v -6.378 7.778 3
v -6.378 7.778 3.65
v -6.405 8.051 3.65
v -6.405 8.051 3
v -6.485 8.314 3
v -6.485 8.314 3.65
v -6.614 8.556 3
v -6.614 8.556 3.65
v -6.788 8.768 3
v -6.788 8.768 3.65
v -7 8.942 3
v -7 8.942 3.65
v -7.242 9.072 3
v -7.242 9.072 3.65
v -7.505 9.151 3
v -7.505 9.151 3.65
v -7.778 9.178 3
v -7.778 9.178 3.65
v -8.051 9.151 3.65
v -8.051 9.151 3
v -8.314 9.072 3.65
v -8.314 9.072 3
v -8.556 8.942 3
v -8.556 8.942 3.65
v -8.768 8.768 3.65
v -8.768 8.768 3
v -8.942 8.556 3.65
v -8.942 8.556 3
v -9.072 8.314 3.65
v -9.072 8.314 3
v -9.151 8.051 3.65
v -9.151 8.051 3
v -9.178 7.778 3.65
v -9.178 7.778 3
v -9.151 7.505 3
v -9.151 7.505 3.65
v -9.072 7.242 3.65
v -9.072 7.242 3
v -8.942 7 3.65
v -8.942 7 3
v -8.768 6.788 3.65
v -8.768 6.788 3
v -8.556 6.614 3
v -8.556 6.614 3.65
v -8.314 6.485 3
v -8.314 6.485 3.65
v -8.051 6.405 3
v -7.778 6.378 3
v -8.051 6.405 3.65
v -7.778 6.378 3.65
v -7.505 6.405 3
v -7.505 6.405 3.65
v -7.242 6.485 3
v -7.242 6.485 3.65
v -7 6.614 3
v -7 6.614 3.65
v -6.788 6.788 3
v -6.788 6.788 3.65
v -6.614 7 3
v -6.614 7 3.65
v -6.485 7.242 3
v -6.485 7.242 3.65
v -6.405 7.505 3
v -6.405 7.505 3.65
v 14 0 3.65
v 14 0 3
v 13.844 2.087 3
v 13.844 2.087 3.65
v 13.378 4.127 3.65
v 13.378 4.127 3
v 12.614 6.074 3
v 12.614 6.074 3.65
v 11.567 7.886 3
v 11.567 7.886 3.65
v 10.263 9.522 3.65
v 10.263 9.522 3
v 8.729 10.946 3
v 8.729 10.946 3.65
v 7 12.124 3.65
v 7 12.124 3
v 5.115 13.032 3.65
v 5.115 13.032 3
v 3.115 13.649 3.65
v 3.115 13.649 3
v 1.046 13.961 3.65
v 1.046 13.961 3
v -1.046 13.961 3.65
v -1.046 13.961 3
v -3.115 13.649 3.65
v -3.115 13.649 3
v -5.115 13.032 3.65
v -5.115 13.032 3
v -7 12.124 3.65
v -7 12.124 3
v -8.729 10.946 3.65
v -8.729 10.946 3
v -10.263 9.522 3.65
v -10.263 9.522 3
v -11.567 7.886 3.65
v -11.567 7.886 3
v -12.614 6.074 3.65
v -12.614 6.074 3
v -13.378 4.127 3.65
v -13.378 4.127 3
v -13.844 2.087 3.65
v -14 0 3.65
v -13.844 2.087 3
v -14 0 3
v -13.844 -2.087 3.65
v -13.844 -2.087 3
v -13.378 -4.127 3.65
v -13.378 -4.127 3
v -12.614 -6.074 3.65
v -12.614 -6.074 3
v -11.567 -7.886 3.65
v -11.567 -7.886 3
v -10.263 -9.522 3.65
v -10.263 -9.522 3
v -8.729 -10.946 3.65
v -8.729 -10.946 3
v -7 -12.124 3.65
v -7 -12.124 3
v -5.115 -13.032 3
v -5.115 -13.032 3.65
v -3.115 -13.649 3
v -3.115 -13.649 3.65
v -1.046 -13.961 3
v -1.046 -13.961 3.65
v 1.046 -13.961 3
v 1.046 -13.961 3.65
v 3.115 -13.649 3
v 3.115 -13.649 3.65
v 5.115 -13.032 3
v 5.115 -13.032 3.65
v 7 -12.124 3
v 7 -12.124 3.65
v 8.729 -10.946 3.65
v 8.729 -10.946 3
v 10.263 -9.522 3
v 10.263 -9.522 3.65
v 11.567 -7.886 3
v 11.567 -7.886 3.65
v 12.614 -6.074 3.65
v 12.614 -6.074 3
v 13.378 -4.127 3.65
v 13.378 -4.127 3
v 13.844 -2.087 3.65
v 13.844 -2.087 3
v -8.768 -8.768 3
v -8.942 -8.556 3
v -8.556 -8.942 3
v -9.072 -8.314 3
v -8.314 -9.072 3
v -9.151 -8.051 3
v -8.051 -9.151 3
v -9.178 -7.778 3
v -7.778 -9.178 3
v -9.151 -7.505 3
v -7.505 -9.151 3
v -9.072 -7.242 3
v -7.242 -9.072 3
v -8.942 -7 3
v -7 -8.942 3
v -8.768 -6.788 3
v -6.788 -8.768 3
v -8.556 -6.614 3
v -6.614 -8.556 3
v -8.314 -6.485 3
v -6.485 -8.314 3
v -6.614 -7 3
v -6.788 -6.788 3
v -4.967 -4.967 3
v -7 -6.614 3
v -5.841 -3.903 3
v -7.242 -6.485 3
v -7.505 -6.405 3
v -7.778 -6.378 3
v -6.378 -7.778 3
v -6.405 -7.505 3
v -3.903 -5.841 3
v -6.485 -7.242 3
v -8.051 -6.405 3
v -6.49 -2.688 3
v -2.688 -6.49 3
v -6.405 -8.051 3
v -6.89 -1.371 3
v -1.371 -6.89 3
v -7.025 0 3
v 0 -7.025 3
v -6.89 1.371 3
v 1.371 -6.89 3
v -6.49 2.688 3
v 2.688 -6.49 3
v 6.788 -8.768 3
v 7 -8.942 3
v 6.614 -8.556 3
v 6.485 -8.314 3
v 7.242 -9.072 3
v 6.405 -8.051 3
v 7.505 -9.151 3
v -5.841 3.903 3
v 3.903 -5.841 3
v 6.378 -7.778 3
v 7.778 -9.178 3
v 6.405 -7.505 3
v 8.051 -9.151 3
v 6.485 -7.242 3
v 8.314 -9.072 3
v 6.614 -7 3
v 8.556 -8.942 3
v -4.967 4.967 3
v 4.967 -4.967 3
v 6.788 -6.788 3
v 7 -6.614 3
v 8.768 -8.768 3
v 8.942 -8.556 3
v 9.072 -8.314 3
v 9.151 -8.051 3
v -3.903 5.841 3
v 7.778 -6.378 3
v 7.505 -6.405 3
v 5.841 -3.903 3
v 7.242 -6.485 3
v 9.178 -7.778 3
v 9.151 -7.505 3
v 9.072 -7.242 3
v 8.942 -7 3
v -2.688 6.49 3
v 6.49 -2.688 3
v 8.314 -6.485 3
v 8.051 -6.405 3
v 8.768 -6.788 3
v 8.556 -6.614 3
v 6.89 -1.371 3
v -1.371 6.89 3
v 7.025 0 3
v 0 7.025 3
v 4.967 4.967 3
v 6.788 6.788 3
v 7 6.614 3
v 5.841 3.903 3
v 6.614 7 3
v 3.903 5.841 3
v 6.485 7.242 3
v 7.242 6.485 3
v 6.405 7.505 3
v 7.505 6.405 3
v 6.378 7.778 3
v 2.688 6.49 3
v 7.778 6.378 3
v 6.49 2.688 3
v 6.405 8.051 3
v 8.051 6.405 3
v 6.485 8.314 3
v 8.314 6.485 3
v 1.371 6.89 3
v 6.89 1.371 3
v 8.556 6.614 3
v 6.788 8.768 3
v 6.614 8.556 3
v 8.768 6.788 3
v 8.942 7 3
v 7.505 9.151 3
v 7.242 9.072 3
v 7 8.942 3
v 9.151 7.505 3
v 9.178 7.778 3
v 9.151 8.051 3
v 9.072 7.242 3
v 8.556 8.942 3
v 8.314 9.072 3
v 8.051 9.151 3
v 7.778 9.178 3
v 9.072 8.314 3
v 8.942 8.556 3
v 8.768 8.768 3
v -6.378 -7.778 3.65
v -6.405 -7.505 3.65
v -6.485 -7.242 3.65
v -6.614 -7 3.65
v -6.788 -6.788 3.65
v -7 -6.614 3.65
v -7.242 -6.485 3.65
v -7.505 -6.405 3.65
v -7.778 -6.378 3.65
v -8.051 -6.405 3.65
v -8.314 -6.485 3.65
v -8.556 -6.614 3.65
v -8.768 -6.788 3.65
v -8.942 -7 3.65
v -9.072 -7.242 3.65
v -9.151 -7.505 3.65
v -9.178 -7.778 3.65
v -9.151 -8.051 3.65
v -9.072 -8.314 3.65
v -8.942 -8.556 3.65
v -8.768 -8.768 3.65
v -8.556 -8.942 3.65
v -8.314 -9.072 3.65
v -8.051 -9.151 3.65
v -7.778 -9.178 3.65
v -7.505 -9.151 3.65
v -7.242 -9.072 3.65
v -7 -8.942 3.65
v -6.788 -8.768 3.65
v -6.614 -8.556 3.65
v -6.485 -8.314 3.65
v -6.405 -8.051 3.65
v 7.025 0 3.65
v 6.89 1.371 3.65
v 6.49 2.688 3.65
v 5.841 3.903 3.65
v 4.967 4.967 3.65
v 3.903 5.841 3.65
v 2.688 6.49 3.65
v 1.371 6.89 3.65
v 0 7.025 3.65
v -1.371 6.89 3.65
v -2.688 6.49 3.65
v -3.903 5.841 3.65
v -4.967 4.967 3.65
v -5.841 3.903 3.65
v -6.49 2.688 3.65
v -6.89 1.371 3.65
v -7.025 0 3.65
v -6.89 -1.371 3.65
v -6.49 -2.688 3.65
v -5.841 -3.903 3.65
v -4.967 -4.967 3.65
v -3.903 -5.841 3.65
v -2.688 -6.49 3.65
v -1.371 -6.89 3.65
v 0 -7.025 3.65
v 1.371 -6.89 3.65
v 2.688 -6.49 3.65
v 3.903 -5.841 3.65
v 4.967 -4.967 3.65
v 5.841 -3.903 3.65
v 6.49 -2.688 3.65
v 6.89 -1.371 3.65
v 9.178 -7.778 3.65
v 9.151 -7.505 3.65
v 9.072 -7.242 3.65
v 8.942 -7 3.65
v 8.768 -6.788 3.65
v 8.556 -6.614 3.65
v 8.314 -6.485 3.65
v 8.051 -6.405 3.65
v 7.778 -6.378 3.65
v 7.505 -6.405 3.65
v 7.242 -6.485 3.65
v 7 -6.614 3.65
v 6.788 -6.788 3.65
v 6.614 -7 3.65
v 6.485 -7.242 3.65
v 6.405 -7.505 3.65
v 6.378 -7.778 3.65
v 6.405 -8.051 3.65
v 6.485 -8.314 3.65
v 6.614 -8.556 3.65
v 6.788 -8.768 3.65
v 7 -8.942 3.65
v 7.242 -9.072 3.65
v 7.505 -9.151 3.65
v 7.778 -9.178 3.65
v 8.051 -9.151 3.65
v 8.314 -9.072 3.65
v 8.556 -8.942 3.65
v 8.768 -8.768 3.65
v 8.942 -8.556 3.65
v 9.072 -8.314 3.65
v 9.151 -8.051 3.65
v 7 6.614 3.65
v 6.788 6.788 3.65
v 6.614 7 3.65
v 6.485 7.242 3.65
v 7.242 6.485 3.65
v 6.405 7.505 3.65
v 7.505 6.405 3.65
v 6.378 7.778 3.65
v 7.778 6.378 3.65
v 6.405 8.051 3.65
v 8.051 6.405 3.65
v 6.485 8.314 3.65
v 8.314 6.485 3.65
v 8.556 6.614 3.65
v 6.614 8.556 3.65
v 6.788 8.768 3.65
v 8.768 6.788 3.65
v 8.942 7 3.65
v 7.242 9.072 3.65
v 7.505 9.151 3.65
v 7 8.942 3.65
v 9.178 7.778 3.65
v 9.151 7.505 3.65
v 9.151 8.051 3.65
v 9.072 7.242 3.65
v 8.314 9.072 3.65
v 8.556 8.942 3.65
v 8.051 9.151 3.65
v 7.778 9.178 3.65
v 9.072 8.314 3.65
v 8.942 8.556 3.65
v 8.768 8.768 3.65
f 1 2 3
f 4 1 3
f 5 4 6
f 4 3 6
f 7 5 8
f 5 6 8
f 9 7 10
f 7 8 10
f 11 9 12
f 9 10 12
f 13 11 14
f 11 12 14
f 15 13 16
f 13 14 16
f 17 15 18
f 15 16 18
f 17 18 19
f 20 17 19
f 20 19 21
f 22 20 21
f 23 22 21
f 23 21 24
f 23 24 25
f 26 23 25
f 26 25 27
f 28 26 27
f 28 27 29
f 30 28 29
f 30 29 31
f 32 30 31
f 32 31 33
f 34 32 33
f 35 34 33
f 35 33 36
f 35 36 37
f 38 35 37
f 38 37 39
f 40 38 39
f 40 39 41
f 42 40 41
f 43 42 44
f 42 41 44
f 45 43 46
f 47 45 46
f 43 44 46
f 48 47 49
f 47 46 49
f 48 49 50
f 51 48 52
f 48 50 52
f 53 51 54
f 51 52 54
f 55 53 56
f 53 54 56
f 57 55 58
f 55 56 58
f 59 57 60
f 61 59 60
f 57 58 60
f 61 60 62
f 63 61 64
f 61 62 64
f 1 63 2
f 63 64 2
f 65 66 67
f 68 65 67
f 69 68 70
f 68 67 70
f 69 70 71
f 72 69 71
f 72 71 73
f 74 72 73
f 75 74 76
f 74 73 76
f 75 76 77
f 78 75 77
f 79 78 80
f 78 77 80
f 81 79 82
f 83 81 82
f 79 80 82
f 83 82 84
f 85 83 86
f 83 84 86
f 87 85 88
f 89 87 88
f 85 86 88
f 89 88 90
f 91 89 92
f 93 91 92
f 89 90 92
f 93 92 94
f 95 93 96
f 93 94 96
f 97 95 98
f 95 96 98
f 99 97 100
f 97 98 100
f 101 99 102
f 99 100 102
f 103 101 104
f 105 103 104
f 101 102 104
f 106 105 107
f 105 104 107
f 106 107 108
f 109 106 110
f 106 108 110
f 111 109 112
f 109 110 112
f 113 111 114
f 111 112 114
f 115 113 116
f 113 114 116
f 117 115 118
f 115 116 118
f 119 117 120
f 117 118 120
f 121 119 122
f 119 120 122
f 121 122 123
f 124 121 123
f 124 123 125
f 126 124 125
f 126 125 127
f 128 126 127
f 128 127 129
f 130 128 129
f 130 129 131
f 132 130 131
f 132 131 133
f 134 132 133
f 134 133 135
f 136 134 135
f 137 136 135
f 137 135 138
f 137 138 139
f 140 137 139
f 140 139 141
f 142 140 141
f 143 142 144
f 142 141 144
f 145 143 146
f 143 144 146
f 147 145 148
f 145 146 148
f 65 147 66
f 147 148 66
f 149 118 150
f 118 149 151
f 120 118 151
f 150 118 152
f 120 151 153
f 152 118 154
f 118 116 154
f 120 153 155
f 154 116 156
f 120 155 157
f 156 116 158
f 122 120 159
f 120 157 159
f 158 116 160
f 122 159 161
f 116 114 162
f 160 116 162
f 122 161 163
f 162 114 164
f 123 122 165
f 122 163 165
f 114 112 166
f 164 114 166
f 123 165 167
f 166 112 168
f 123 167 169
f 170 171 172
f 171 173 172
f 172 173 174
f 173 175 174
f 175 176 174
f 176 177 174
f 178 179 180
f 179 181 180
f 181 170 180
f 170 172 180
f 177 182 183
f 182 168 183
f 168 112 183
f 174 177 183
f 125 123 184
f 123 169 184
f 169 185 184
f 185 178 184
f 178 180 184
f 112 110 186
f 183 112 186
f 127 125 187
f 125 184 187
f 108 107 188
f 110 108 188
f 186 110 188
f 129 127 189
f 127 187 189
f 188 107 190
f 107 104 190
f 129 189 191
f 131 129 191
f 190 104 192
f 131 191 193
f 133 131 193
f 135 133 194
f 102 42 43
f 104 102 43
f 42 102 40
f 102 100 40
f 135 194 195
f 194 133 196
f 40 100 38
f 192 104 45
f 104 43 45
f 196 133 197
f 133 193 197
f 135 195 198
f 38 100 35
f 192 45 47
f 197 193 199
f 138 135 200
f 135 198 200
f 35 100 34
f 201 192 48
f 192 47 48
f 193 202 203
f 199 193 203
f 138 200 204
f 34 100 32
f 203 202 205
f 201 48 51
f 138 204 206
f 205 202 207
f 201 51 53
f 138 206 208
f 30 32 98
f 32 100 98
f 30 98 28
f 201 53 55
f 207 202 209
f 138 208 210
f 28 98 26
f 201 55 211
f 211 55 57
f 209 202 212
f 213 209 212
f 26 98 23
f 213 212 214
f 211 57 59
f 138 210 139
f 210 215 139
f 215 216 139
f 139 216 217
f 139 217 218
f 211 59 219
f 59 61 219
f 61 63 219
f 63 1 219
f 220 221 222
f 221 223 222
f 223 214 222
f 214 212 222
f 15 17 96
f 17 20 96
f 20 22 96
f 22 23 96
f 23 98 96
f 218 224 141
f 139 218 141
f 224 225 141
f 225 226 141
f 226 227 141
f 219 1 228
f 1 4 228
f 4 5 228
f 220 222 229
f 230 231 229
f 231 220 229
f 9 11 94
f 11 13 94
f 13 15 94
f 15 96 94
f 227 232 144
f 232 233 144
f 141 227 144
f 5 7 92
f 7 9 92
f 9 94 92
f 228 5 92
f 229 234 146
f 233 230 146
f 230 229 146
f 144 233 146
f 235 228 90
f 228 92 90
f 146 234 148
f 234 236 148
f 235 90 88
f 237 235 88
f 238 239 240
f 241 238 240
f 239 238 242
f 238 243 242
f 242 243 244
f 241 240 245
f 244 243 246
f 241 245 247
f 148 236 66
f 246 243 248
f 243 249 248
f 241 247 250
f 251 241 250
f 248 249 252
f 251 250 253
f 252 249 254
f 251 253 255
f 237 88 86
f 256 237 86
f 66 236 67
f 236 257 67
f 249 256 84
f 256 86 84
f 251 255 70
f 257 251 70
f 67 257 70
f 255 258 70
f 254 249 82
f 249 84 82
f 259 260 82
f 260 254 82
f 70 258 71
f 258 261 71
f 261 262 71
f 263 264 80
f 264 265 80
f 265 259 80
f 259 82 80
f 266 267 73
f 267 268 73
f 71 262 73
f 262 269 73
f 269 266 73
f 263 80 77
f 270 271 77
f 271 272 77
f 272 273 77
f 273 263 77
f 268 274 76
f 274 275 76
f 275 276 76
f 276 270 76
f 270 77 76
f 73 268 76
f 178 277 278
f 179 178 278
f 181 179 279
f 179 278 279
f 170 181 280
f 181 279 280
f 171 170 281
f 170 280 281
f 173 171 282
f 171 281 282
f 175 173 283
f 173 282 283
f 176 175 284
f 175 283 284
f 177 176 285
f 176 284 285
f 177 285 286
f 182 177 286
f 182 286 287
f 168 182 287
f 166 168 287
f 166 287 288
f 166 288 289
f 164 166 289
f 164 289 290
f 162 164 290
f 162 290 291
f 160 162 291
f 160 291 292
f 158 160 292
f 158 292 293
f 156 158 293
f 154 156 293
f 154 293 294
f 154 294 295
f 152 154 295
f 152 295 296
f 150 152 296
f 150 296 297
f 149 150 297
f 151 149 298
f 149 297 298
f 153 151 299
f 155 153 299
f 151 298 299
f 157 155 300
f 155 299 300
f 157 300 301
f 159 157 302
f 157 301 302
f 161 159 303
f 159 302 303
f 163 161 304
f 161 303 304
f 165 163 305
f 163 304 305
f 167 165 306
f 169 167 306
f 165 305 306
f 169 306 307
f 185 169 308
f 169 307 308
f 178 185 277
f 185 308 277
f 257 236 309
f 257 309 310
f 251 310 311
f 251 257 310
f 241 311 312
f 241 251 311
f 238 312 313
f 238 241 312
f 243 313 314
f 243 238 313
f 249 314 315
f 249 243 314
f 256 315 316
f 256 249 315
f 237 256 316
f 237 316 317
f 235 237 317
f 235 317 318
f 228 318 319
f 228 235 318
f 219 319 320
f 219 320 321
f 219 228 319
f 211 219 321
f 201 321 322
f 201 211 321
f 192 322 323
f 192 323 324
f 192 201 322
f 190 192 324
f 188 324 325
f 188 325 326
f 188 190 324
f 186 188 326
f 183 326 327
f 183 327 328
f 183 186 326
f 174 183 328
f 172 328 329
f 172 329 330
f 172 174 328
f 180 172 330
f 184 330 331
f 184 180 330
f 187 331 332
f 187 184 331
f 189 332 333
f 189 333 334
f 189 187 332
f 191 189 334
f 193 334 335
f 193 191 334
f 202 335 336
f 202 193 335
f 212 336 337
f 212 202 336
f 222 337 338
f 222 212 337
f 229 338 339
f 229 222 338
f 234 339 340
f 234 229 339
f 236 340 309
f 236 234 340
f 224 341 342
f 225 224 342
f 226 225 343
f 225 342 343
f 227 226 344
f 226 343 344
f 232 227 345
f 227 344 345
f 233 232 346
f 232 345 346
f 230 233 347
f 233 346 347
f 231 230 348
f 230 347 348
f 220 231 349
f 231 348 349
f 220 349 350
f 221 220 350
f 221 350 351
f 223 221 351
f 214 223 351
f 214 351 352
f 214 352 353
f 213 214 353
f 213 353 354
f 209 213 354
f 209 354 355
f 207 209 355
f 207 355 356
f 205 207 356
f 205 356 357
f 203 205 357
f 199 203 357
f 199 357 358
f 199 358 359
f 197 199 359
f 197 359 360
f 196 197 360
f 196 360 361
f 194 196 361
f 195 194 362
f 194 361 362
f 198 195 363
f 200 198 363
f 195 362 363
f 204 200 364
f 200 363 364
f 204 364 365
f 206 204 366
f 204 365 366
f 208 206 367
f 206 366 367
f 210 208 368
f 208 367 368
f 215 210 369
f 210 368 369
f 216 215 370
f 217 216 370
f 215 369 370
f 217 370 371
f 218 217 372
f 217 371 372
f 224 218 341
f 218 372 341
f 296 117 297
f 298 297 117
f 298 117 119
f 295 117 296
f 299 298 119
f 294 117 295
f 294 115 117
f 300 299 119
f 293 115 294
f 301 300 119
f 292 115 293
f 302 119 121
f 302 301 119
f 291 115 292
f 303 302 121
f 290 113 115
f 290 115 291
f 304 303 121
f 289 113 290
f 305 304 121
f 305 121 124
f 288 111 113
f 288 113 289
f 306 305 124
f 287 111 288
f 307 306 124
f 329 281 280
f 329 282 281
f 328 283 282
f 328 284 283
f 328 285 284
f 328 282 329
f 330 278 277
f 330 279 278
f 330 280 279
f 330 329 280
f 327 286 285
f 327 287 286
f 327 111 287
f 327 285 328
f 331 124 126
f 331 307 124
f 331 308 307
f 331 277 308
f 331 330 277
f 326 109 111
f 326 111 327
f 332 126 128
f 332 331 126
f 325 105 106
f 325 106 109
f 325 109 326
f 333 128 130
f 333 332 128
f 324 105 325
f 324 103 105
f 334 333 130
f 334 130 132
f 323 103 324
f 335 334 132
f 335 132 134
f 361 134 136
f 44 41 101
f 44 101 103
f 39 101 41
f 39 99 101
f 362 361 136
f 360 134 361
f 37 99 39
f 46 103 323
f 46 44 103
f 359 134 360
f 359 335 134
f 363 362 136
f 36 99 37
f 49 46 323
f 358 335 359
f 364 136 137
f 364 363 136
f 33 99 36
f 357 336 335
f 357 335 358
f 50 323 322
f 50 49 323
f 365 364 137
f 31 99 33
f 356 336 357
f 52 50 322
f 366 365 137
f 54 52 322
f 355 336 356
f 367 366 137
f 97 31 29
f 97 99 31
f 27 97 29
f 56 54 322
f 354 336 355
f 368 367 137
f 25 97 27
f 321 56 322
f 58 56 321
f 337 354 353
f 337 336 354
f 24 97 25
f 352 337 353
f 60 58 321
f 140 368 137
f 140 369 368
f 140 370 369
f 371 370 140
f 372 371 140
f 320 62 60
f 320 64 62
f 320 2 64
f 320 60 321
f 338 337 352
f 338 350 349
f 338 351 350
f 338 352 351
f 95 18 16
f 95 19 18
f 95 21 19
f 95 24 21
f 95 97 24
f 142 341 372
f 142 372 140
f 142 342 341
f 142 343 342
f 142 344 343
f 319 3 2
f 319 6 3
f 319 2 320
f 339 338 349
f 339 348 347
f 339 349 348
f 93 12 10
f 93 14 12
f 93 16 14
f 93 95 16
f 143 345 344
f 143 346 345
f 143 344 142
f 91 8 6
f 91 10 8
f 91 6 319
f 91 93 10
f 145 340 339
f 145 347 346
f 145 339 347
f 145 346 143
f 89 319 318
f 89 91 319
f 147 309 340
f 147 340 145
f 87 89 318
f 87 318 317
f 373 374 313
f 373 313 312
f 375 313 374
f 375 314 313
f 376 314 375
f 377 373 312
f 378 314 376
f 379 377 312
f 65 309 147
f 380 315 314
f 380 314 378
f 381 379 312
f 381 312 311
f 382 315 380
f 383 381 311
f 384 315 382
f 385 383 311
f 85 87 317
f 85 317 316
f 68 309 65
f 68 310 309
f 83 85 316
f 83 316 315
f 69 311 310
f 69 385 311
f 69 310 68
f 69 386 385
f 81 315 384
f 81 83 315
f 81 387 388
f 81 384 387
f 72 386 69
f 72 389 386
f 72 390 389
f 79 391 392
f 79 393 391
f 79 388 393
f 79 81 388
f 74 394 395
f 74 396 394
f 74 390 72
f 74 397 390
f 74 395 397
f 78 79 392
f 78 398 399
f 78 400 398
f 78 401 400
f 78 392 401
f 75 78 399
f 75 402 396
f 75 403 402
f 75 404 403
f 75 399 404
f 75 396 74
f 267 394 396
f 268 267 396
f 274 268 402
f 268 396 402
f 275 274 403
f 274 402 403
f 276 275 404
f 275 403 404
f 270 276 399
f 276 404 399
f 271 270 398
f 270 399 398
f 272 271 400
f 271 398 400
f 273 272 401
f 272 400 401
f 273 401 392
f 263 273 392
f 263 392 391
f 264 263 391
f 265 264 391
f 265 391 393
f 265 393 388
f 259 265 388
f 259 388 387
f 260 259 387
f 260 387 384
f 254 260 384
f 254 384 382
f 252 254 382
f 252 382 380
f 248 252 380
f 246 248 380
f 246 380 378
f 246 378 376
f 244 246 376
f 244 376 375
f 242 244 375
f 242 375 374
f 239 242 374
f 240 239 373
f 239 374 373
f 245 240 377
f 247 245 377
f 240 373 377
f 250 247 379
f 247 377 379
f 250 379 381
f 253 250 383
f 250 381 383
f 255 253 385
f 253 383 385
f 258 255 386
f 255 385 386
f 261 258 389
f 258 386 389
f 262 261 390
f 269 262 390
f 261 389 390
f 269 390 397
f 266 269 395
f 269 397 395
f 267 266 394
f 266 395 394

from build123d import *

# Parameters (mm, degrees)
HUB_ENDPLATE_AXIAL_CLEARANCE_SHIM_H0P65_START = 3
SKETCH1_R                                     = 14
SKETCH1_R_2                                   = 7.025
HUB_ENDPLATE_AXIAL_CLEARANCE_SHIM_H0P65_DEPTH = 0.65
SKETCH2_R                                     = 1.4
FOUR_D2P8_PCD22_DEPTH                         = 20.809656736


with BuildPart() as part:
    # Sketch1 → Hub_Endplate_Axial_Clearance_Shim_H0p65 (new body)
    with BuildSketch(Plane.XY.offset(HUB_ENDPLATE_AXIAL_CLEARANCE_SHIM_H0P65_START)):
        Circle(SKETCH1_R)
        Circle(SKETCH1_R_2, mode=Mode.SUBTRACT)
    extrude(amount=HUB_ENDPLATE_AXIAL_CLEARANCE_SHIM_H0P65_DEPTH)

    # Sketch2 → Four_D2p8_PCD22 (cut, through all)
    with BuildSketch(Plane.XY.offset(3.65)):
        with Locations((7.778174593, 7.778174593)):
            Circle(SKETCH2_R)
        with Locations((-7.778174593, 7.778174593)):
            Circle(SKETCH2_R)
        with Locations((-7.778174593, -7.778174593)):
            Circle(SKETCH2_R)
        with Locations((7.778174593, -7.778174593)):
            Circle(SKETCH2_R)
    extrude(amount=-FOUR_D2P8_PCD22_DEPTH, mode=Mode.SUBTRACT)


solid = part.part
